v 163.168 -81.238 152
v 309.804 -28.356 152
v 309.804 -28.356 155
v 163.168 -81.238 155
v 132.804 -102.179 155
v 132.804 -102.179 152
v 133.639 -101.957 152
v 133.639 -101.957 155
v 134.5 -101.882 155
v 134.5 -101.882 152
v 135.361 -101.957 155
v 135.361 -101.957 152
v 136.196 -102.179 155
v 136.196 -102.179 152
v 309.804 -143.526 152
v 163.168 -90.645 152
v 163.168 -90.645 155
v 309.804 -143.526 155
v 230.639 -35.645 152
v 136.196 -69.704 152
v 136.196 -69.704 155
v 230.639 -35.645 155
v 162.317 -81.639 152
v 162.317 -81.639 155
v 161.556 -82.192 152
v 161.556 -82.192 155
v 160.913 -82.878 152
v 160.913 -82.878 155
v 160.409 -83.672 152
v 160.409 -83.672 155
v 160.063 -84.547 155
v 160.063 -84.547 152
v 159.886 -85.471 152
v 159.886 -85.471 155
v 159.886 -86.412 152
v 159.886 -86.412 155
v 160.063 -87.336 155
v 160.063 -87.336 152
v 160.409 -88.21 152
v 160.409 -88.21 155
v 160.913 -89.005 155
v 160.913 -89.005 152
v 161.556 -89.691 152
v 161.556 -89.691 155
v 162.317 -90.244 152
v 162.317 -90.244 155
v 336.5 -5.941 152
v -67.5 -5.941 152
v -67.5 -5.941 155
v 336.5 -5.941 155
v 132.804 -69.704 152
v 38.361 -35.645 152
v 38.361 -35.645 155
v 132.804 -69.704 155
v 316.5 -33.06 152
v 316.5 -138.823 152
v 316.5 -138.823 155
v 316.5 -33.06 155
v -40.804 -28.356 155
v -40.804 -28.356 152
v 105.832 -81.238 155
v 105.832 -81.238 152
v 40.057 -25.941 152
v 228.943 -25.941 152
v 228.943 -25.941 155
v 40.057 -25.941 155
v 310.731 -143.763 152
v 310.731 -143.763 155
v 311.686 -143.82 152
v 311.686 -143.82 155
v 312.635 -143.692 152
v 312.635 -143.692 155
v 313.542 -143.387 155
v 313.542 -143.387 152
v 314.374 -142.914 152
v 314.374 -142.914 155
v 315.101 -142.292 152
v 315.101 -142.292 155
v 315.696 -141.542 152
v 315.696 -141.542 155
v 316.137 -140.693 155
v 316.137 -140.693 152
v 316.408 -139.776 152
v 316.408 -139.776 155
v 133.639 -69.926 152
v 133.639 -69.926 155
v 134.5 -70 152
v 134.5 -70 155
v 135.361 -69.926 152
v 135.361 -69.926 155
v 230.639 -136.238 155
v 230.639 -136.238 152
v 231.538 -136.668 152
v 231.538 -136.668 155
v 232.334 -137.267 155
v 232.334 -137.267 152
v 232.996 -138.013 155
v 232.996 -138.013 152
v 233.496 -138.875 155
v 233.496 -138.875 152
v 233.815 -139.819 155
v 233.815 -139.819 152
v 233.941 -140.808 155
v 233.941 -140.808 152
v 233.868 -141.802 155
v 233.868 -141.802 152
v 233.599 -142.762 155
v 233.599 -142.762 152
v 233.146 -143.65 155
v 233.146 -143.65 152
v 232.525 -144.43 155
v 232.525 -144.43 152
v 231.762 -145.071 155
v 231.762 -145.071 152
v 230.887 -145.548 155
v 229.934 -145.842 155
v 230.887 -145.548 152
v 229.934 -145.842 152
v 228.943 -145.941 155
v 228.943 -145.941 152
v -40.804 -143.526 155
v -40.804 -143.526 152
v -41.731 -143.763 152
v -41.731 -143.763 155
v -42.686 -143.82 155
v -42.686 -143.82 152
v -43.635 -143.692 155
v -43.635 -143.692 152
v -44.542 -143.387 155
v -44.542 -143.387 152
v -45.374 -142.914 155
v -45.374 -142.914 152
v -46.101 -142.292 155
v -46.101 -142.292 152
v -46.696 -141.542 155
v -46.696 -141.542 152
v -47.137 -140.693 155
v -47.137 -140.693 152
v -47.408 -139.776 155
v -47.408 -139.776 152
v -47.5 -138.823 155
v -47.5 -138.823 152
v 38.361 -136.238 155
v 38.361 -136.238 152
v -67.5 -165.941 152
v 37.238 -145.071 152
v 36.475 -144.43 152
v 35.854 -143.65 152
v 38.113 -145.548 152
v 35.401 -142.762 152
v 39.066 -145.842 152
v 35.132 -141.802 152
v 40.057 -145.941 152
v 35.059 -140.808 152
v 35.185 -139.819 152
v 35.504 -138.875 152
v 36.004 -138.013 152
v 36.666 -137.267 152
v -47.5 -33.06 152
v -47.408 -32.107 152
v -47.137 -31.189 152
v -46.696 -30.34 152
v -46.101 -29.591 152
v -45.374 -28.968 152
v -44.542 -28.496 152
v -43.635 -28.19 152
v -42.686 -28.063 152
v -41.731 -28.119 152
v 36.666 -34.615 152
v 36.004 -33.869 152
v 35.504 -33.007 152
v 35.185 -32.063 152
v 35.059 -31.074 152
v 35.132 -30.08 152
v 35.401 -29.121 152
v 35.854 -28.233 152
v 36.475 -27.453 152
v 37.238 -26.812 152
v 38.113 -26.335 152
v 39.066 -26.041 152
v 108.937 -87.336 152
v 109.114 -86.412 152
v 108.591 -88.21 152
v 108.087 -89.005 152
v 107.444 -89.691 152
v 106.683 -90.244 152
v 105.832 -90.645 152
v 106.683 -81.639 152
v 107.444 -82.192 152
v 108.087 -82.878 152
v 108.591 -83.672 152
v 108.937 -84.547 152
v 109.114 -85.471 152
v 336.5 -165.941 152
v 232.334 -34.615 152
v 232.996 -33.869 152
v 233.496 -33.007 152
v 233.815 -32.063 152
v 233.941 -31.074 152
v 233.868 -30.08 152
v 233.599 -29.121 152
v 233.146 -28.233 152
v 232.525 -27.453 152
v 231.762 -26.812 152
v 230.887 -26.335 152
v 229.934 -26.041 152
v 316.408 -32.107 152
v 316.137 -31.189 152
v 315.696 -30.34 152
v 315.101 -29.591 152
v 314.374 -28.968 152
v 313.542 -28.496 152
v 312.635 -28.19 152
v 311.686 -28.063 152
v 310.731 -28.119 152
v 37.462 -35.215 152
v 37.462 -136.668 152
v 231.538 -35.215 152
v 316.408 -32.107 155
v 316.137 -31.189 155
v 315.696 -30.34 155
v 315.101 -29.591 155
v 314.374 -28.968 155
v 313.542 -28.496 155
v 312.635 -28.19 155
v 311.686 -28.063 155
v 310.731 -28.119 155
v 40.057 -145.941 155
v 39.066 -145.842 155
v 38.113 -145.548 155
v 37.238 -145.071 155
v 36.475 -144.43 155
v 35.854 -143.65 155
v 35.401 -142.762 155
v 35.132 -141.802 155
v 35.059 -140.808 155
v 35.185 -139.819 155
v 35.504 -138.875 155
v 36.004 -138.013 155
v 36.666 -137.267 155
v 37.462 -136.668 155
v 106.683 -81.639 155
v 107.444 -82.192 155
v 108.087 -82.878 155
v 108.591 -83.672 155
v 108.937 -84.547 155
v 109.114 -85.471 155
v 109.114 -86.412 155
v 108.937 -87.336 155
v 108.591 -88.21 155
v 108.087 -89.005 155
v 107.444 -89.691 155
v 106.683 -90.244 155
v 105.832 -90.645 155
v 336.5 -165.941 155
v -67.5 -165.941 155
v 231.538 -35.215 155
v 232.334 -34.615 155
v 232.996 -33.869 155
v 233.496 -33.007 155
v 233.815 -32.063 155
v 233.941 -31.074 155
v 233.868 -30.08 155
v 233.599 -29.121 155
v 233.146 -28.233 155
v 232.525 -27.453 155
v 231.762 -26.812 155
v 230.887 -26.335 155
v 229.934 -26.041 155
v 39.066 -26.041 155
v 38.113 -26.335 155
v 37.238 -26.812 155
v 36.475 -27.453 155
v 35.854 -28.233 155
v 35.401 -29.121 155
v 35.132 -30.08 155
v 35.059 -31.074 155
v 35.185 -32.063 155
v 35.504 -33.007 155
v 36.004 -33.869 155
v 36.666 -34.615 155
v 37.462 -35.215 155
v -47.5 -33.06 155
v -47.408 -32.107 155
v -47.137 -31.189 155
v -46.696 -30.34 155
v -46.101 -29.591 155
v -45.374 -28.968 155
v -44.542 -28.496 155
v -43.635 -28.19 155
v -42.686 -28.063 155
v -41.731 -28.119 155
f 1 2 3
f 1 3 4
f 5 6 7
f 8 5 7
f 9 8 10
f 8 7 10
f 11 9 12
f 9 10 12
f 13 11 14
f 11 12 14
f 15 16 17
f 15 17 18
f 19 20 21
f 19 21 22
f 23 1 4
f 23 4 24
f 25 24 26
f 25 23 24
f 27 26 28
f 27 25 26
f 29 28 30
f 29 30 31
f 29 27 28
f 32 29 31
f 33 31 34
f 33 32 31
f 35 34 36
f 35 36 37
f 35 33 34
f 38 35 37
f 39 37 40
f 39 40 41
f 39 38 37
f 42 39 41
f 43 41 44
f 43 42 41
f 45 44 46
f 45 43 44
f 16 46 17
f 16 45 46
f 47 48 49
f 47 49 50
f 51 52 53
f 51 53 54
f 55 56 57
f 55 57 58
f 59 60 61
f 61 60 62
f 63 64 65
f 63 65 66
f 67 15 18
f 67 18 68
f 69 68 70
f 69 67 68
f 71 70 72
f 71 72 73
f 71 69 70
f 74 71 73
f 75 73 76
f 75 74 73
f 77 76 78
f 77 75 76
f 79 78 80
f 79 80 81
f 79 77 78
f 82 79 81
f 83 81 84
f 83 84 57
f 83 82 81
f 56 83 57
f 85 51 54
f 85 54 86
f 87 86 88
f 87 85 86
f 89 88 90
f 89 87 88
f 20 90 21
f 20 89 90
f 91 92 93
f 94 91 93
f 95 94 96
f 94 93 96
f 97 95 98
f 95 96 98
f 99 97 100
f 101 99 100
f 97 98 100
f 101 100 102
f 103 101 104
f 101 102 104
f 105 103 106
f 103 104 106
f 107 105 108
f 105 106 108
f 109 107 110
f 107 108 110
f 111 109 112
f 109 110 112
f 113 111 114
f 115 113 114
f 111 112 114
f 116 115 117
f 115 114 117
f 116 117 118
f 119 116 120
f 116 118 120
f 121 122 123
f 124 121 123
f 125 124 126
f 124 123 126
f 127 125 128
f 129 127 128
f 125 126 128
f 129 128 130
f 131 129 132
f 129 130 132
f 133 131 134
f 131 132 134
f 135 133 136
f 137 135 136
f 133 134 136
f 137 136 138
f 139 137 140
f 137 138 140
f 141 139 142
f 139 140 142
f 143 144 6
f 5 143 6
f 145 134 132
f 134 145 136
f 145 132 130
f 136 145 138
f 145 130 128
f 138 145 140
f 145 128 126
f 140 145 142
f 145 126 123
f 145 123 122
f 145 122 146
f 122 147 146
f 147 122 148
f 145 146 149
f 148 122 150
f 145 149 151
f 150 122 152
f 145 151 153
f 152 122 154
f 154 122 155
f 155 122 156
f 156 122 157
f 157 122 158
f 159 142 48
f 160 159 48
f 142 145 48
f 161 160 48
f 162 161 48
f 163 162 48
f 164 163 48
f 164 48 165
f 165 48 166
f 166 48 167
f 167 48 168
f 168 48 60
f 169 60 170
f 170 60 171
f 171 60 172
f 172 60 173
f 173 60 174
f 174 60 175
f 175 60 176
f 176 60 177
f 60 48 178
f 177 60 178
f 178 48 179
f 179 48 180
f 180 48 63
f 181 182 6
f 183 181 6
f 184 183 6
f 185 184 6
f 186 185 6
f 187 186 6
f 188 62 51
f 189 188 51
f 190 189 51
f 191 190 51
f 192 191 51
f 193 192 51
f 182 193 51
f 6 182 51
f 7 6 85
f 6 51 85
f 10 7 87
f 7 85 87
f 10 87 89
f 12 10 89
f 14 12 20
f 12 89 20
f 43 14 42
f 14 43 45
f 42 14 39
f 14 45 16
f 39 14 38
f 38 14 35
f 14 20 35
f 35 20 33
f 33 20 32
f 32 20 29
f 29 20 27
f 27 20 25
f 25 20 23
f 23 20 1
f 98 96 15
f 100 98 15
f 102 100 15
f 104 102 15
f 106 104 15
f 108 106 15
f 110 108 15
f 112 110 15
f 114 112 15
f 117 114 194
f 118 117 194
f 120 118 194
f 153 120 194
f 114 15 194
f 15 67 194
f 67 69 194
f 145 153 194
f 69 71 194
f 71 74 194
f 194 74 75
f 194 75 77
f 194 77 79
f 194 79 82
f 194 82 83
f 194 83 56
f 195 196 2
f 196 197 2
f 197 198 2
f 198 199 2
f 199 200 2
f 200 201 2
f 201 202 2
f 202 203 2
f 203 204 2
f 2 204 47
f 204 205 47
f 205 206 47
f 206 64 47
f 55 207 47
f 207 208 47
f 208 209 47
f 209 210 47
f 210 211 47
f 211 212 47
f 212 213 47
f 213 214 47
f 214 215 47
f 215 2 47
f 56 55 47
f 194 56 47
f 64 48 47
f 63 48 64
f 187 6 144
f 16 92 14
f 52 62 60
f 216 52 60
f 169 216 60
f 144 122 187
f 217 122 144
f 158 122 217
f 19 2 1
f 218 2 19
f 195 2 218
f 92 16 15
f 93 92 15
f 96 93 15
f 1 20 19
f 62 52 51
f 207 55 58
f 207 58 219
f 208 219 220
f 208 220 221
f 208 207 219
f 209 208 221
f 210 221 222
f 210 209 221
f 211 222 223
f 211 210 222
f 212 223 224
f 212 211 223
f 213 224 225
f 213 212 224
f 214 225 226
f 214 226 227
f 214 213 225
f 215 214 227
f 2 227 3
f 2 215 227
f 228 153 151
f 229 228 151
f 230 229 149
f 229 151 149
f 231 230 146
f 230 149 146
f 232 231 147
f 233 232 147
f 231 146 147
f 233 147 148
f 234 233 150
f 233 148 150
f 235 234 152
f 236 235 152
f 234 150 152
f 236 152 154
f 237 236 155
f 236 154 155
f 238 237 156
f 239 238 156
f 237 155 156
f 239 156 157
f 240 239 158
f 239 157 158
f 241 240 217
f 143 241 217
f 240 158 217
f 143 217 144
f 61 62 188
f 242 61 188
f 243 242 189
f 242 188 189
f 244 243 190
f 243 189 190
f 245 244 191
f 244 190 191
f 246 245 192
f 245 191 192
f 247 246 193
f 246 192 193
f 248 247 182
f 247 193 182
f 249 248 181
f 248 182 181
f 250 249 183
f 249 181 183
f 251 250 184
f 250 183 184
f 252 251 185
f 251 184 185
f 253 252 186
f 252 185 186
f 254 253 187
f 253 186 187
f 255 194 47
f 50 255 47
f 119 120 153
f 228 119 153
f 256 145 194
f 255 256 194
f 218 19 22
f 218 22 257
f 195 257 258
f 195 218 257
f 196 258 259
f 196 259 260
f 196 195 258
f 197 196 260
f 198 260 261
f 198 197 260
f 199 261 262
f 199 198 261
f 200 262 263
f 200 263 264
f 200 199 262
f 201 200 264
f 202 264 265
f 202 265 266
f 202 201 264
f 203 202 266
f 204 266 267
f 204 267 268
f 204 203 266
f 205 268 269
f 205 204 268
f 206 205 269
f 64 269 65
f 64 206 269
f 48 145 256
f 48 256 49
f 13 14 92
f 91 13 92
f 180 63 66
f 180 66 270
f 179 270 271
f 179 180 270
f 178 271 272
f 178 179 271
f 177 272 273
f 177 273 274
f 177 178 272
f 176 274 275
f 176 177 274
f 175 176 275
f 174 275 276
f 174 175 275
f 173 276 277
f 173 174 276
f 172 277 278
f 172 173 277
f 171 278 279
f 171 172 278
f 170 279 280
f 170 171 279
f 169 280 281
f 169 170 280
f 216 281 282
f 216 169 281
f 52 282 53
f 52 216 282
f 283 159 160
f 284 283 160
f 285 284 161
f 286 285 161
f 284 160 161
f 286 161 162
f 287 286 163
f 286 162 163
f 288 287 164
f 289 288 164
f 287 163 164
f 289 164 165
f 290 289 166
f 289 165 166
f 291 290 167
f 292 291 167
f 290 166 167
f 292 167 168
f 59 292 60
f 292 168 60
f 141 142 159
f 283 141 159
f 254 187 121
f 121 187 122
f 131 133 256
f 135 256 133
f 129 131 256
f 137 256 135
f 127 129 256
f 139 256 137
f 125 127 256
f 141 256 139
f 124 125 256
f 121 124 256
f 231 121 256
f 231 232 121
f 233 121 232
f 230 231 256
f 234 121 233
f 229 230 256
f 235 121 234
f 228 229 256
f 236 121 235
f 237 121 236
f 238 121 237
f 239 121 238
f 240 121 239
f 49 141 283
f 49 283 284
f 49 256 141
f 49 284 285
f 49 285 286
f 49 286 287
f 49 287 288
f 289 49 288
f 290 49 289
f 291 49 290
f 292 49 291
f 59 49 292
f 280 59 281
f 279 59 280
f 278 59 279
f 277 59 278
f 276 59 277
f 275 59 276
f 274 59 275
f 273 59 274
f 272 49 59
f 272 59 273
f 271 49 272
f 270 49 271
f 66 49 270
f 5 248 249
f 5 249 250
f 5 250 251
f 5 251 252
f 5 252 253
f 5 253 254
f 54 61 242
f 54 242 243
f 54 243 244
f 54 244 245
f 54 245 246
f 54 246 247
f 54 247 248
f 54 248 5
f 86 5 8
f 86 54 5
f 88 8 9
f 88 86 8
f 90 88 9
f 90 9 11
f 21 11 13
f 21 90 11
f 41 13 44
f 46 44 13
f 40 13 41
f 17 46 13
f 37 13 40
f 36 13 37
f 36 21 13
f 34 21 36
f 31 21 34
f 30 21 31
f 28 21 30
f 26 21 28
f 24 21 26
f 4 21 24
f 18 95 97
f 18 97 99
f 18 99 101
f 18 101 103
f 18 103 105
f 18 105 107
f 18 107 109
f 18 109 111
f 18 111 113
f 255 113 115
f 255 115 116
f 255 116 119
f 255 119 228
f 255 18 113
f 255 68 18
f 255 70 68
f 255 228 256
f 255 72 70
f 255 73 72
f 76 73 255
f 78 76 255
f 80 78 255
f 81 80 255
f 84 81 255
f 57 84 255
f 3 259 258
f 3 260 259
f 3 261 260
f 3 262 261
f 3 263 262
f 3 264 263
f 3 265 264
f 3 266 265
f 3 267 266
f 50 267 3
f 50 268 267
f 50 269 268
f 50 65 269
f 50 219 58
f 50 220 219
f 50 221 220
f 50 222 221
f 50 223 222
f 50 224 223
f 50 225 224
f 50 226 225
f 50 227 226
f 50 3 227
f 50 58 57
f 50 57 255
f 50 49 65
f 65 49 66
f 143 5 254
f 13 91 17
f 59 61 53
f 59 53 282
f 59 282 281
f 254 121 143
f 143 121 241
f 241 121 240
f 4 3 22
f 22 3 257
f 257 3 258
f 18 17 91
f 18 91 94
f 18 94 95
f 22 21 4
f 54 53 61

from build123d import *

# Parameters (mm, degrees)
SKETCH1_W           = 404
SKETCH1_H           = 160
BOSS_EXTRUDE1_DEPTH = 3


with BuildPart() as part:
    # Sketch1 → Boss-Extrude1 (new body)
    with BuildSketch(Plane.XY.offset(152)):
        with Locations((134.5, -85.941341737)):
            Rectangle(SKETCH1_W, SKETCH1_H)
        with BuildLine():
            Line((-47.5, -138.822974494), (-47.5, -33.059708979))
            ThreePointArc((-47.5, -33.059708979), (-45.373921063, -28.968183869), (-40.80376891, -28.356220902))
            Line((-40.80376891, -28.356220902), (105.831987613, -81.23785366))
            ThreePointArc((105.831987613, -81.23785366), (109.135756522, -85.941341737), (105.831987613, -90.644829813))
            Line((105.831987613, -90.644829813), (-40.80376891, -143.526462571))
            ThreePointArc((-40.80376891, -143.526462571), (-45.373921063, -142.914499604), (-47.5, -138.822974494))
        make_face(mode=Mode.SUBTRACT)
        with BuildLine():
            Line((228.942684704, -25.941341737), (40.057315296, -25.941341737))
            ThreePointArc((40.057315296, -25.941341737), (35.132001073, -30.080365658), (38.361084206, -35.644829813))
            Line((38.361084206, -35.644829813), (132.80376891, -69.703939867))
            ThreePointArc((132.80376891, -69.703939867), (134.5, -70.00045179), (136.19623109, -69.703939867))
            Line((136.19623109, -69.703939867), (230.638915794, -35.644829813))
            ThreePointArc((230.638915794, -35.644829813), (233.867998927, -30.080365658), (228.942684704, -25.941341737))
        make_face(mode=Mode.SUBTRACT)
        with BuildLine():
            Line((309.80376891, -28.356220902), (163.168012387, -81.23785366))
            ThreePointArc((163.168012387, -81.23785366), (159.864243478, -85.941341737), (163.168012387, -90.644829813))
            Line((163.168012387, -90.644829813), (309.80376891, -143.526462571))
            ThreePointArc((309.80376891, -143.526462571), (314.373921063, -142.914499604), (316.5, -138.822974494))
            Line((316.5, -138.822974494), (316.5, -33.059708979))
            ThreePointArc((316.5, -33.059708979), (314.373921063, -28.968183869), (309.80376891, -28.356220902))
        make_face(mode=Mode.SUBTRACT)
        with BuildLine():
            Line((38.361084206, -136.23785366), (132.80376891, -102.178743606))
            ThreePointArc((132.80376891, -102.178743606), (134.5, -101.882231683), (136.19623109, -102.178743606))
            Line((136.19623109, -102.178743606), (230.638915794, -136.23785366))
            ThreePointArc((230.638915794, -136.23785366), (233.867998927, -141.802317815), (228.942684704, -145.941341737))
            Line((228.942684704, -145.941341737), (40.057315296, -145.941341737))
            ThreePointArc((40.057315296, -145.941341737), (35.132001073, -141.802317815), (38.361084206, -136.23785366))
        make_face(mode=Mode.SUBTRACT)
    extrude(amount=BOSS_EXTRUDE1_DEPTH)


solid = part.part
